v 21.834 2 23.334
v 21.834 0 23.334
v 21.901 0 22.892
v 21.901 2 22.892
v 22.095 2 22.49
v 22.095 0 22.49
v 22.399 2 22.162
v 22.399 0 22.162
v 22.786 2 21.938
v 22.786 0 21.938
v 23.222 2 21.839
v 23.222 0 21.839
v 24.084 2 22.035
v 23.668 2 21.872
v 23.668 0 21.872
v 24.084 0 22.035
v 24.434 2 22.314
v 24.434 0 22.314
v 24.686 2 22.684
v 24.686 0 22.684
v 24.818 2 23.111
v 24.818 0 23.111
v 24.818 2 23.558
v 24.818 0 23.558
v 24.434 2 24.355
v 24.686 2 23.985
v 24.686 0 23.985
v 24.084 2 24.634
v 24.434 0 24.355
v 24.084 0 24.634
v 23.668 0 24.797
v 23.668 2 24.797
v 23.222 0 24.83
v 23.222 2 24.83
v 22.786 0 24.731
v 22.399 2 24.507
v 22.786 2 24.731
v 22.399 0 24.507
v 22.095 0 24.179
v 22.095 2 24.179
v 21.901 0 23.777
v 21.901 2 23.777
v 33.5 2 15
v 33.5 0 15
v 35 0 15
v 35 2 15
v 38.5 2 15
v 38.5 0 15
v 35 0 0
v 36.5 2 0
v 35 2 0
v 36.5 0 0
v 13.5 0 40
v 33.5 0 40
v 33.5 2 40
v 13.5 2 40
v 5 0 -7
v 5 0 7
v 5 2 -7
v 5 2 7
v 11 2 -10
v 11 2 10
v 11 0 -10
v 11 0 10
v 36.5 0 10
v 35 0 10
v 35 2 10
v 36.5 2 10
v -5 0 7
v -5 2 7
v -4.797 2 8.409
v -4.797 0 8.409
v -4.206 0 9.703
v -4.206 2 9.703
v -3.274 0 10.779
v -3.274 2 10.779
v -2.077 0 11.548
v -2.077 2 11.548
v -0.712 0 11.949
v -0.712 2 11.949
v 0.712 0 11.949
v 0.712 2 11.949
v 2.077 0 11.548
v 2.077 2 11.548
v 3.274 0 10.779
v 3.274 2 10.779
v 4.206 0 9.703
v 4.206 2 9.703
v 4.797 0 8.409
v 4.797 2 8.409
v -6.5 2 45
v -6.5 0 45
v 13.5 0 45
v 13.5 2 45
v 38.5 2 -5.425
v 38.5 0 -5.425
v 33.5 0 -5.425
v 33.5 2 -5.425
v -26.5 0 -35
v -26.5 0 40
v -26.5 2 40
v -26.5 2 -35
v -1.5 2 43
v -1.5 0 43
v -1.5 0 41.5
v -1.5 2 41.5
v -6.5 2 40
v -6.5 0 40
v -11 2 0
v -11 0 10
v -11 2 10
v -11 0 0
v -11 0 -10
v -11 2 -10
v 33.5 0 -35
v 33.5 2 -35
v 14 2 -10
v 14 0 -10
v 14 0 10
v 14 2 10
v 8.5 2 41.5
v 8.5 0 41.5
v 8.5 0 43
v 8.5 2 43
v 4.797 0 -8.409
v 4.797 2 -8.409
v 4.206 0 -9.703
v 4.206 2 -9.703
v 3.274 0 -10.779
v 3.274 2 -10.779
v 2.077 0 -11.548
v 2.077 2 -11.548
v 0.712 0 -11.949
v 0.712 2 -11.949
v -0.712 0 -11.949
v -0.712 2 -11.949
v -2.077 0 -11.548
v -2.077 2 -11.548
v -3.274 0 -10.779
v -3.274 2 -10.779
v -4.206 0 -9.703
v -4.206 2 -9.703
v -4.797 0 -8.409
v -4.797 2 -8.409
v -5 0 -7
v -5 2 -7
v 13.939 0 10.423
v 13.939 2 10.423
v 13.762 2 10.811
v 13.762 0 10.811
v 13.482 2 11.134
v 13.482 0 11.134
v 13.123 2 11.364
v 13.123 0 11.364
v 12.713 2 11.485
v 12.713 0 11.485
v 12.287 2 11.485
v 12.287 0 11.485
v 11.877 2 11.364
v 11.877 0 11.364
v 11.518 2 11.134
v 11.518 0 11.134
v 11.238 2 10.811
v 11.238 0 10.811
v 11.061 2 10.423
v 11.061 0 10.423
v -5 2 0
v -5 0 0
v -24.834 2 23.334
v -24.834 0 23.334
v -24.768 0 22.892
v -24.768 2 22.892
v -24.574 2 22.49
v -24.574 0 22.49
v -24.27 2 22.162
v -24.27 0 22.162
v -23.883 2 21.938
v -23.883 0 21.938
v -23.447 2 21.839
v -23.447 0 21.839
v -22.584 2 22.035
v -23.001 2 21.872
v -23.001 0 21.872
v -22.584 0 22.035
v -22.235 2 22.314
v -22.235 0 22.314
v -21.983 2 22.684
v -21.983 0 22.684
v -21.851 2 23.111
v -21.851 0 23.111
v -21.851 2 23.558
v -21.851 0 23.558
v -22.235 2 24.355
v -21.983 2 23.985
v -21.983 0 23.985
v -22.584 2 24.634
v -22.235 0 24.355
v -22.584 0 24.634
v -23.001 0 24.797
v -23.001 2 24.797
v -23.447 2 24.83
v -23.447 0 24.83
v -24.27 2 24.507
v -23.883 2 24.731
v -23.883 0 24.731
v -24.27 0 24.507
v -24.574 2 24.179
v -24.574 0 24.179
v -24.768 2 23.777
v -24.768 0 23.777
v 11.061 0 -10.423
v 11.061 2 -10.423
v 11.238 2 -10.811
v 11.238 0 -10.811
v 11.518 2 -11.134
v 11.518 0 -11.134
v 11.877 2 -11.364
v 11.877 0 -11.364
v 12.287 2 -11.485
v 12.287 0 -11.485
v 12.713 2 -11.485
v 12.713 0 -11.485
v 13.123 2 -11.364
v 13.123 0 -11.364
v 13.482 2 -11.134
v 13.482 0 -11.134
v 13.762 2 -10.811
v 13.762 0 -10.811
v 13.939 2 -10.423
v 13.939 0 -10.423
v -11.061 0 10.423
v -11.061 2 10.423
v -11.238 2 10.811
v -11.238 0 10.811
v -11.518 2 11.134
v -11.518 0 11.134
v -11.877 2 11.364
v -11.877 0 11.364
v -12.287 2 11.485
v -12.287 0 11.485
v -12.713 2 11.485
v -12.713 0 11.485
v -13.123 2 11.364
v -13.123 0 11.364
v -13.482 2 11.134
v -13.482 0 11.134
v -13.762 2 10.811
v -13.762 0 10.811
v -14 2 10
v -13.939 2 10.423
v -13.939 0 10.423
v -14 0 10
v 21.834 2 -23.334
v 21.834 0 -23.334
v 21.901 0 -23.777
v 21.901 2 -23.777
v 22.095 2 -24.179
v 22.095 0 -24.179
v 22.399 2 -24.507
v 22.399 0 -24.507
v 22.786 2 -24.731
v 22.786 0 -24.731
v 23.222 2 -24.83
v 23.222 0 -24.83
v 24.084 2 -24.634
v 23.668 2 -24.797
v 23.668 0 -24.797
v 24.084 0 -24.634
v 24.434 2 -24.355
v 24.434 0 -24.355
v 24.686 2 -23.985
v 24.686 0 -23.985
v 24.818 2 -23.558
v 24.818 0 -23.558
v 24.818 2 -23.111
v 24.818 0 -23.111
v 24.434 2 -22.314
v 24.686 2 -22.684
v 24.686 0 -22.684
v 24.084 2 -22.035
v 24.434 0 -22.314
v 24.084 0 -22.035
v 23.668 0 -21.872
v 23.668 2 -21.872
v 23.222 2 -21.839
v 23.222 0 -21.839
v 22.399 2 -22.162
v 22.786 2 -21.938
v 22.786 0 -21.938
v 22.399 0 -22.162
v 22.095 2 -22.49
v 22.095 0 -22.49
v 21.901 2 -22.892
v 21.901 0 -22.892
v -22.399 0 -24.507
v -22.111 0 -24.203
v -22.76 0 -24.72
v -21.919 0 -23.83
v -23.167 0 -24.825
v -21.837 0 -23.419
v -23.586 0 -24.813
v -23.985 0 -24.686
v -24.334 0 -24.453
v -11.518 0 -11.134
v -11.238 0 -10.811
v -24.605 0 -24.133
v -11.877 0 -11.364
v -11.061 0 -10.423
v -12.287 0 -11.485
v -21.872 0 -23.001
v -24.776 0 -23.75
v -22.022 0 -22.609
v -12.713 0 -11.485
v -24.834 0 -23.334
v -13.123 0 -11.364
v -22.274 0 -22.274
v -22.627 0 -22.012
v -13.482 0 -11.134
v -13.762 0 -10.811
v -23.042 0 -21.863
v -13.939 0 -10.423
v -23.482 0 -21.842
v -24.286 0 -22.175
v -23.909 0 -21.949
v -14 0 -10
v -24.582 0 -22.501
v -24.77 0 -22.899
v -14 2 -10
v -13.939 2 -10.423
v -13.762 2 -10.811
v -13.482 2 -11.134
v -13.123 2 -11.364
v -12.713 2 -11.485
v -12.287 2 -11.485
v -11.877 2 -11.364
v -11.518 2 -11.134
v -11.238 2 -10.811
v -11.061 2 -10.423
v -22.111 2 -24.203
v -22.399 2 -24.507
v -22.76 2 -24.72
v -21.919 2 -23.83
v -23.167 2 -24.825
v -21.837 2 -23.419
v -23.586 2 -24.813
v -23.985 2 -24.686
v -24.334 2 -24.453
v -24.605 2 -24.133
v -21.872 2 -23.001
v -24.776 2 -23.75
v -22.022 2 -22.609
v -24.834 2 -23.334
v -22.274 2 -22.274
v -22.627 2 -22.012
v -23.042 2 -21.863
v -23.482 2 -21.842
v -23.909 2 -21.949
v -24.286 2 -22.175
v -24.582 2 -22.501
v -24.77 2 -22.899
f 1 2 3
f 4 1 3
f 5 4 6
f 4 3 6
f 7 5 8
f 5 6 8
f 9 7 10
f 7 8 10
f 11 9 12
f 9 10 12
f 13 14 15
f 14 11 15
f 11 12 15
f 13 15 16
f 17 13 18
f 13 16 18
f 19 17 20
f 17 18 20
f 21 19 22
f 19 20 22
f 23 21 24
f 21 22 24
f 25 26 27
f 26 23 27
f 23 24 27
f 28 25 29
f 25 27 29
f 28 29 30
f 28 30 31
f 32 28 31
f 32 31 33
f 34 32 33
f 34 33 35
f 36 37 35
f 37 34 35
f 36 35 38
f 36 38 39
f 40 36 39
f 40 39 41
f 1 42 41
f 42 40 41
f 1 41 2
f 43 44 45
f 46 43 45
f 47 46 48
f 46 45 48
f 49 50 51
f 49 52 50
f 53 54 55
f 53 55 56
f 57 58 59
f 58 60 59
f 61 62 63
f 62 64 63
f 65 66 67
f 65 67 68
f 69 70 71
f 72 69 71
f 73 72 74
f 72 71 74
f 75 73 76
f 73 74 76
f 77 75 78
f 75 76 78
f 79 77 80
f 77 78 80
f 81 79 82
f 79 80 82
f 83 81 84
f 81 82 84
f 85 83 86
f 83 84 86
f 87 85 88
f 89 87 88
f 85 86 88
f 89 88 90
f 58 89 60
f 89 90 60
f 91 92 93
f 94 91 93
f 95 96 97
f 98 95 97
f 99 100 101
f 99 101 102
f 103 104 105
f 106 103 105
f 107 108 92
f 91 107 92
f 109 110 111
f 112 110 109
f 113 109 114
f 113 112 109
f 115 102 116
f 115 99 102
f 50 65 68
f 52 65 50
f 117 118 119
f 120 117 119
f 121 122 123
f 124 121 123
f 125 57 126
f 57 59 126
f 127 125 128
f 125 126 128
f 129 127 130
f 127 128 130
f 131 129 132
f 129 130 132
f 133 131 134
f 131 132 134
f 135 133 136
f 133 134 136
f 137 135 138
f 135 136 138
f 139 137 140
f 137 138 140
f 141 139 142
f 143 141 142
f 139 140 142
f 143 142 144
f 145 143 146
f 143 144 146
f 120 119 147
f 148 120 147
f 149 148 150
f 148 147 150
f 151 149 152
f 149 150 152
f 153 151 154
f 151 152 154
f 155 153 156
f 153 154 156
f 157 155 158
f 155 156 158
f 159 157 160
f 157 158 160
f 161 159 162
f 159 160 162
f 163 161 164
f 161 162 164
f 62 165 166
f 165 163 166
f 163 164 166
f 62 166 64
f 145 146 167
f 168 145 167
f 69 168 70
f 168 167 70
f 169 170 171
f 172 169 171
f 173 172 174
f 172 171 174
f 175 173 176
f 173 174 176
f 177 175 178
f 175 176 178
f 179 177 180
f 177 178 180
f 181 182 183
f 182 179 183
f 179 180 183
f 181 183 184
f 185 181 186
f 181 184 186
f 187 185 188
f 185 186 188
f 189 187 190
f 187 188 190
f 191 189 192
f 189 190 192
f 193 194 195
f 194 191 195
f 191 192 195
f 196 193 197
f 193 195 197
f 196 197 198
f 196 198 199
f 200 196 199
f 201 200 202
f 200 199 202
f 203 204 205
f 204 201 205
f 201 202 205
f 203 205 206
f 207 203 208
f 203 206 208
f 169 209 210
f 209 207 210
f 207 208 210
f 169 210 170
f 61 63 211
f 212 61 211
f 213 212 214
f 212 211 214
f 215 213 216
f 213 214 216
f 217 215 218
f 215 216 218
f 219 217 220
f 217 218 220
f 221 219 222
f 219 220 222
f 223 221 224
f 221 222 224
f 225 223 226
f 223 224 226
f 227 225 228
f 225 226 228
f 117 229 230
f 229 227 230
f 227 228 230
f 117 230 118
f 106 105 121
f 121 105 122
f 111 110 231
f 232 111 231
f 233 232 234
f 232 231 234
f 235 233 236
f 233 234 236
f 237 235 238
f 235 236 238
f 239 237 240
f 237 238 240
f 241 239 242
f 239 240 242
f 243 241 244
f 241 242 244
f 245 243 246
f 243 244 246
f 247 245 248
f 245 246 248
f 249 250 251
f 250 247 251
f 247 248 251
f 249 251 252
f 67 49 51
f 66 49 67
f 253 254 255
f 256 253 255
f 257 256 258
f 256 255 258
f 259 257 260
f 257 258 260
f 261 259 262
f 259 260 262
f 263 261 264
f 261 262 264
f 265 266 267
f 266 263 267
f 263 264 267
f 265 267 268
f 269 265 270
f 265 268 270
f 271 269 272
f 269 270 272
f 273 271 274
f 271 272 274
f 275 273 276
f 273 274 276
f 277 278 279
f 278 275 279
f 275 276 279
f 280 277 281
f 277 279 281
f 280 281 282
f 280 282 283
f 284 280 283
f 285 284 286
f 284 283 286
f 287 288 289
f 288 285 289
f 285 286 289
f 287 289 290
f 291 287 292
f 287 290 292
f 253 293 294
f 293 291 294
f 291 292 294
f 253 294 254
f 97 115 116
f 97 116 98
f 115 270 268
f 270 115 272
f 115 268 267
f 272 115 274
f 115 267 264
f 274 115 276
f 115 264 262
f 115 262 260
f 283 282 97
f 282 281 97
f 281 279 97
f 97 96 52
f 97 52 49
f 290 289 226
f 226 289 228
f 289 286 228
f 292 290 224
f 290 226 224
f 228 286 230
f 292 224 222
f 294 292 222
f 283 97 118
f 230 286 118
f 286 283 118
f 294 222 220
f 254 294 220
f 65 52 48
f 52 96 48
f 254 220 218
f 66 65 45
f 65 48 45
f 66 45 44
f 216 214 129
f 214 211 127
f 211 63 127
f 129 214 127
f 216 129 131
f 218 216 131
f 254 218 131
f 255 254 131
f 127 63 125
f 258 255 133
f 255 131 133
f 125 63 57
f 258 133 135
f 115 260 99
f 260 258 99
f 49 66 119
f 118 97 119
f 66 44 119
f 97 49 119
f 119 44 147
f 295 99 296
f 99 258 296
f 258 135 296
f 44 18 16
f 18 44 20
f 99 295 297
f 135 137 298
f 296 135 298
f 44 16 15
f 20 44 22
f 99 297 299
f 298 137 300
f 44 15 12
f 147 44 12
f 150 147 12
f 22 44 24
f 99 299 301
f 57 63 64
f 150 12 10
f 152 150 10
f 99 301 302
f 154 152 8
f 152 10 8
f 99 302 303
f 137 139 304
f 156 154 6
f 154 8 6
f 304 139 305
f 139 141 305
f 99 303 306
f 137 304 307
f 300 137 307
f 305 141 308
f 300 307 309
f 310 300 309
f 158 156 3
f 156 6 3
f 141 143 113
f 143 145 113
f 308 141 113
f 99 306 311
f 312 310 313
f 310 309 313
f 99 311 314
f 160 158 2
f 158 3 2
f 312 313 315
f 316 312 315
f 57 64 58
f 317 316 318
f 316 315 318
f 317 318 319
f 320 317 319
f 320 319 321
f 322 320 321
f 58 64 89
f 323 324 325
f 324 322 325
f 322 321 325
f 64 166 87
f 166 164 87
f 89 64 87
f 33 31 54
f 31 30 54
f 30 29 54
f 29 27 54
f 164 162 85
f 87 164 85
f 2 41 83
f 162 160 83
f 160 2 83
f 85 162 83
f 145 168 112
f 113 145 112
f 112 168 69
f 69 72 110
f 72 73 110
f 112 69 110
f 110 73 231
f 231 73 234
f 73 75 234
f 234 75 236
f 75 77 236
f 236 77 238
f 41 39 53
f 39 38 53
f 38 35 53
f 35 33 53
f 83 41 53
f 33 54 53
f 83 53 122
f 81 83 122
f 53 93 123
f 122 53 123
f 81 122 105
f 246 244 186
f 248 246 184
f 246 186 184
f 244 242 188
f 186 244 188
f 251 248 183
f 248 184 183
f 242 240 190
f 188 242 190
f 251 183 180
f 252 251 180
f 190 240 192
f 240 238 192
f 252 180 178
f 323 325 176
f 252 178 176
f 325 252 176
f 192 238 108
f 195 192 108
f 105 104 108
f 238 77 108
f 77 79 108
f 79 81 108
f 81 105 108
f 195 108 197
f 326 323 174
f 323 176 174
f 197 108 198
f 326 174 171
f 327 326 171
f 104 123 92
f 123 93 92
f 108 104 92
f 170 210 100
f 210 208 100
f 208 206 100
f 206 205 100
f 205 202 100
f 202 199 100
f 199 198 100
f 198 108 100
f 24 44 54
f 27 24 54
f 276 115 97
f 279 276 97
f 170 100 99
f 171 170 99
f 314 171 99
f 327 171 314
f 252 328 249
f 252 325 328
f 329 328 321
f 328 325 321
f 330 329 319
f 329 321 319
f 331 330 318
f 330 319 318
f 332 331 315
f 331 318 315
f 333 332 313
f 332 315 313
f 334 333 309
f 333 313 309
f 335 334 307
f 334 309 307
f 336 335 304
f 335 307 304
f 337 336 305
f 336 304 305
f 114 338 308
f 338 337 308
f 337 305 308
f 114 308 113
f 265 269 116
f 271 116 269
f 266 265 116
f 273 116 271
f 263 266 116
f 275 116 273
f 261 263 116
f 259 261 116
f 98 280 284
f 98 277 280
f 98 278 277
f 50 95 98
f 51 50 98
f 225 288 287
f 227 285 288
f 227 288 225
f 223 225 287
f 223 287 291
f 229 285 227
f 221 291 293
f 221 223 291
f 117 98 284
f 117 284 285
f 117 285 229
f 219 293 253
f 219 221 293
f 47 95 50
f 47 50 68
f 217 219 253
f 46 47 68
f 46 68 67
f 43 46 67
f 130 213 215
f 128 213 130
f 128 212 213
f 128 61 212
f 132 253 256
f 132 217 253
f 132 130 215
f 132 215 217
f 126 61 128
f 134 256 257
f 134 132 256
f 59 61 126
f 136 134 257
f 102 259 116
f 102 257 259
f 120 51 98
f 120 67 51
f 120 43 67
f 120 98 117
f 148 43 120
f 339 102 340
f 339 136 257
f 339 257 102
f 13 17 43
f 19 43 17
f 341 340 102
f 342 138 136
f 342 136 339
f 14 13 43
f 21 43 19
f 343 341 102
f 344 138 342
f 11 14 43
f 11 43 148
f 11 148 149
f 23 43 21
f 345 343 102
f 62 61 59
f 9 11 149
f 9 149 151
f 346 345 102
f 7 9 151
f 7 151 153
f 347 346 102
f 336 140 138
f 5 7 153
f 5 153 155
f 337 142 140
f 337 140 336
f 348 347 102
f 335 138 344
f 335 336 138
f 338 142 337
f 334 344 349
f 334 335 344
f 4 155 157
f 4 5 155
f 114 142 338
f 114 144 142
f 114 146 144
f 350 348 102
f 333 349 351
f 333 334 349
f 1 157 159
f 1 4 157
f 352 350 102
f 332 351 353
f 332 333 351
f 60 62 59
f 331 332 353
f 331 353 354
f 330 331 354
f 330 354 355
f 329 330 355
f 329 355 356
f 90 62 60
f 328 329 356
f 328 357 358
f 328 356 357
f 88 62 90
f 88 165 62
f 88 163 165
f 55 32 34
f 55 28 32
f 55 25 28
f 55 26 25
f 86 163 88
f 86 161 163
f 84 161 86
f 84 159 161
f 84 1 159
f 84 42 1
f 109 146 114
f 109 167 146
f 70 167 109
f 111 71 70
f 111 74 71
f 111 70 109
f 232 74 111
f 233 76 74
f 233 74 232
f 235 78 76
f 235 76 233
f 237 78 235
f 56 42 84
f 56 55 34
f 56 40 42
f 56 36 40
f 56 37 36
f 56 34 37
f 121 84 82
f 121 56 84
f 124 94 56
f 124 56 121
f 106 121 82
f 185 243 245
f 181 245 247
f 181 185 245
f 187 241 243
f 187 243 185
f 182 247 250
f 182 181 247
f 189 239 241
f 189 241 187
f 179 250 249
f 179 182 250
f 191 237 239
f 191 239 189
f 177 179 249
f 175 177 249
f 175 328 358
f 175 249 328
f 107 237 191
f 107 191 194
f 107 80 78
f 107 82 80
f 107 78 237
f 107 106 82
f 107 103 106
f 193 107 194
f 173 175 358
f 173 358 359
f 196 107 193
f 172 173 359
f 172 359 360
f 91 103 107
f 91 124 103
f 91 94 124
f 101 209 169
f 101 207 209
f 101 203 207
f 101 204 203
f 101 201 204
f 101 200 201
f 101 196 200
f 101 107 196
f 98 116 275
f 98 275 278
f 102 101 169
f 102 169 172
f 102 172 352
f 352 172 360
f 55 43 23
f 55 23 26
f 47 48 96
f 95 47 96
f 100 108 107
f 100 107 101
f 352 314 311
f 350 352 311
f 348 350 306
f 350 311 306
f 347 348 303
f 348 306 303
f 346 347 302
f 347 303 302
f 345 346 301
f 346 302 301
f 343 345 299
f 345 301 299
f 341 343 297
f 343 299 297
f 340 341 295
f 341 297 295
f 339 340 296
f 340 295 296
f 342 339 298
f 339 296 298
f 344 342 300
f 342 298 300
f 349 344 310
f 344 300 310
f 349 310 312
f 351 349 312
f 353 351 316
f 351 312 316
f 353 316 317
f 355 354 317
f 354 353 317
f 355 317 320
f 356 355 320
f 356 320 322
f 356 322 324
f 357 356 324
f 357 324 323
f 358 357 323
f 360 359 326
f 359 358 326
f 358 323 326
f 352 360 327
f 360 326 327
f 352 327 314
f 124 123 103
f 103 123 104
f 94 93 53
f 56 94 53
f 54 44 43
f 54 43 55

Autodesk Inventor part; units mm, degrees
ref_plane "YZ Plane" through (0, 0, 0) normal (1, 0, 0) x (0, 1, 0)
ref_plane "XZ Plane" through (0, 0, 0) normal (0, 1, 0) x (-1, 0, 0)
ref_plane "XY Plane" through (0, 0, 0) normal (0, 0, 1) x (1, 0, 0)
sketch "Sketch1" plane through (0, 0, 0) normal (0, 1, 0) x (-1, 0, 0)
  circle A0 centre (0, 0) radius 5
  line L0 (0, 0) -> (12.5, 0)
  line L1 (12.5, 10) -> (12.5, -10) construction
  line L2 (11, 10) -> (11, -10)
  line L3 (14, -10) -> (14, 10)
  arc A1 (14, 10) -> (11, 10) centre (12.5, 10) ccw
  arc A2 (11, -10) -> (14, -10) centre (12.5, -10) ccw
  circle A3 centre (0, 0) radius 24
  line L4 (0, 0) -> (-33.5, 0)
  line L5 (0, 0) -> (0, 43.5)
  line L6 (-33.5, 0) -> (-33.5, 40)
  line L7 (-33.5, 40) -> (26.5, 40)
  line L8 (26.5, 40) -> (26.5, -35)
  line L9 (26.5, -35) -> (-33.5, -35)
  line L10 (-33.5, -35) -> (-33.5, 0)
  line L11 (-33.5, 40) -> (-13.5, 40)
  line L12 (-13.5, 40) -> (6.5, 40)
  line L13 (6.5, 40) -> (6.5, 45)
  line L14 (6.5, 45) -> (-13.5, 45)
  line L15 (-13.5, 45) -> (-13.5, 40)
  line L16 (-33.5, 40) -> (-33.5, 15)
  line L17 (-33.5, 15) -> (-38.5, 15)
  line L18 (-38.5, 15) -> (-38.5, -5.425)
  line L19 (-38.5, -5.425) -> (-33.5, -5.425)
  line L20 (-33.5, -5.425) -> (-33.5, 15)
  line L21 (-33.5, 15) -> (-35, 15)
  line L22 (-35, 15) -> (-35, 10)
  line L23 (-35, 10) -> (-36.5, 10)
  line L24 (-36.5, 10) -> (-36.5, 0)
  line L25 (-36.5, 0) -> (-35, 0)
  line L26 (-35, 0) -> (-35, 10)
  line L27 (6.5, 40) -> (1.5, 40)
  line L28 (1.5, 40) -> (1.5, 41.5)
  line L29 (1.5, 41.5) -> (-8.5, 41.5)
  line L30 (-8.5, 41.5) -> (-8.5, 43)
  line L31 (-8.5, 43) -> (1.5, 43)
  line L32 (1.5, 43) -> (1.5, 41.5)
  line L33 (0, 0) -> (23.3345, -23.3345)
  line L34 (0, 0) -> (33, 0) construction
  circle A4 centre (23.3345, -23.3345) radius 1.5
  circle A5 centre (23.3345, 23.3345) radius 1.5
  circle A6 centre (-23.3345, 23.3345) radius 1.5
  circle A7 centre (-23.3345, -23.3345) radius 1.5
  line L35 (-11, 10) -> (-11, -10)
  line L36 (-14, -10) -> (-14, 10)
  arc A8 (-11, 10) -> (-14, 10) centre (-12.5, 10) ccw
  arc A9 (-14, -10) -> (-11, -10) centre (-12.5, -10) ccw
  point P0 (6.5, 40)
  dimension "d0" = 10
  dimension "d1" = 12.5
  dimension "d2" = 10
  dimension "d3" = 3
  dimension "d6" = 48
  dimension "d7" = 33.5
  dimension "d8" = 43.5
  dimension "d9" = 60
  dimension "d10" = 75
  dimension "d11" = 20
  dimension "d12" = 20
  dimension "d13" = 5
  dimension "d14" = 25
  dimension "d15" = 5
  dimension "d16" = 1.5
  dimension "d17" = 5
  dimension "d18" = 1.5
  dimension "d19" = 10
  dimension "d20" = 5
  dimension "d21" = 1.5
  dimension "d22" = 10
  dimension "d23" = 1.5
  dimension "d24" = 33
  dimension "d25" = 45
  dimension "d26" = 3
  dimension "d29" = 360
extrude "Extrusion1" add sketch "Sketch1" along normal blind 2 contours A0 L5 A3 L33 | A0 L4 L35 A8 L36 A3 L5 | L33 A3 L4 L36 A9 L35 A0 | L5 L7 L8 L9 L10 L4 A3 | A3 L4 L6 L7 L5 | L7 L15 L14 L13 L28 L32 L31 L30 L29 L5 | L5 L29 L28 L7 | L26 L25 L24 L23 | L10 L19 L18 L17 L6
extrude "Extrusion2" cut sketch "Sketch1" along normal blind 2 contours L26 L25 L24 L23
sketch "Sketch2" plane through (0, 2, 0) normal (0, 1, 0) x (1, 0, 0)
  line L0 (0, -7) -> (0, 7) construction
  line L1 (5, -7) -> (5, 7)
  line L2 (-5, 7) -> (-5, -7)
  arc A0 (-5, -7) -> (5, -7) centre (0, -7) ccw
  arc A1 (5, 7) -> (-5, 7) centre (0, 7) ccw
  point P0 (0, 0)
  dimension "d35" = 7
  dimension "d36" = 10
extrude "Extrusion3" cut sketch "Sketch2" against normal blind 10
properties part number "mount"
